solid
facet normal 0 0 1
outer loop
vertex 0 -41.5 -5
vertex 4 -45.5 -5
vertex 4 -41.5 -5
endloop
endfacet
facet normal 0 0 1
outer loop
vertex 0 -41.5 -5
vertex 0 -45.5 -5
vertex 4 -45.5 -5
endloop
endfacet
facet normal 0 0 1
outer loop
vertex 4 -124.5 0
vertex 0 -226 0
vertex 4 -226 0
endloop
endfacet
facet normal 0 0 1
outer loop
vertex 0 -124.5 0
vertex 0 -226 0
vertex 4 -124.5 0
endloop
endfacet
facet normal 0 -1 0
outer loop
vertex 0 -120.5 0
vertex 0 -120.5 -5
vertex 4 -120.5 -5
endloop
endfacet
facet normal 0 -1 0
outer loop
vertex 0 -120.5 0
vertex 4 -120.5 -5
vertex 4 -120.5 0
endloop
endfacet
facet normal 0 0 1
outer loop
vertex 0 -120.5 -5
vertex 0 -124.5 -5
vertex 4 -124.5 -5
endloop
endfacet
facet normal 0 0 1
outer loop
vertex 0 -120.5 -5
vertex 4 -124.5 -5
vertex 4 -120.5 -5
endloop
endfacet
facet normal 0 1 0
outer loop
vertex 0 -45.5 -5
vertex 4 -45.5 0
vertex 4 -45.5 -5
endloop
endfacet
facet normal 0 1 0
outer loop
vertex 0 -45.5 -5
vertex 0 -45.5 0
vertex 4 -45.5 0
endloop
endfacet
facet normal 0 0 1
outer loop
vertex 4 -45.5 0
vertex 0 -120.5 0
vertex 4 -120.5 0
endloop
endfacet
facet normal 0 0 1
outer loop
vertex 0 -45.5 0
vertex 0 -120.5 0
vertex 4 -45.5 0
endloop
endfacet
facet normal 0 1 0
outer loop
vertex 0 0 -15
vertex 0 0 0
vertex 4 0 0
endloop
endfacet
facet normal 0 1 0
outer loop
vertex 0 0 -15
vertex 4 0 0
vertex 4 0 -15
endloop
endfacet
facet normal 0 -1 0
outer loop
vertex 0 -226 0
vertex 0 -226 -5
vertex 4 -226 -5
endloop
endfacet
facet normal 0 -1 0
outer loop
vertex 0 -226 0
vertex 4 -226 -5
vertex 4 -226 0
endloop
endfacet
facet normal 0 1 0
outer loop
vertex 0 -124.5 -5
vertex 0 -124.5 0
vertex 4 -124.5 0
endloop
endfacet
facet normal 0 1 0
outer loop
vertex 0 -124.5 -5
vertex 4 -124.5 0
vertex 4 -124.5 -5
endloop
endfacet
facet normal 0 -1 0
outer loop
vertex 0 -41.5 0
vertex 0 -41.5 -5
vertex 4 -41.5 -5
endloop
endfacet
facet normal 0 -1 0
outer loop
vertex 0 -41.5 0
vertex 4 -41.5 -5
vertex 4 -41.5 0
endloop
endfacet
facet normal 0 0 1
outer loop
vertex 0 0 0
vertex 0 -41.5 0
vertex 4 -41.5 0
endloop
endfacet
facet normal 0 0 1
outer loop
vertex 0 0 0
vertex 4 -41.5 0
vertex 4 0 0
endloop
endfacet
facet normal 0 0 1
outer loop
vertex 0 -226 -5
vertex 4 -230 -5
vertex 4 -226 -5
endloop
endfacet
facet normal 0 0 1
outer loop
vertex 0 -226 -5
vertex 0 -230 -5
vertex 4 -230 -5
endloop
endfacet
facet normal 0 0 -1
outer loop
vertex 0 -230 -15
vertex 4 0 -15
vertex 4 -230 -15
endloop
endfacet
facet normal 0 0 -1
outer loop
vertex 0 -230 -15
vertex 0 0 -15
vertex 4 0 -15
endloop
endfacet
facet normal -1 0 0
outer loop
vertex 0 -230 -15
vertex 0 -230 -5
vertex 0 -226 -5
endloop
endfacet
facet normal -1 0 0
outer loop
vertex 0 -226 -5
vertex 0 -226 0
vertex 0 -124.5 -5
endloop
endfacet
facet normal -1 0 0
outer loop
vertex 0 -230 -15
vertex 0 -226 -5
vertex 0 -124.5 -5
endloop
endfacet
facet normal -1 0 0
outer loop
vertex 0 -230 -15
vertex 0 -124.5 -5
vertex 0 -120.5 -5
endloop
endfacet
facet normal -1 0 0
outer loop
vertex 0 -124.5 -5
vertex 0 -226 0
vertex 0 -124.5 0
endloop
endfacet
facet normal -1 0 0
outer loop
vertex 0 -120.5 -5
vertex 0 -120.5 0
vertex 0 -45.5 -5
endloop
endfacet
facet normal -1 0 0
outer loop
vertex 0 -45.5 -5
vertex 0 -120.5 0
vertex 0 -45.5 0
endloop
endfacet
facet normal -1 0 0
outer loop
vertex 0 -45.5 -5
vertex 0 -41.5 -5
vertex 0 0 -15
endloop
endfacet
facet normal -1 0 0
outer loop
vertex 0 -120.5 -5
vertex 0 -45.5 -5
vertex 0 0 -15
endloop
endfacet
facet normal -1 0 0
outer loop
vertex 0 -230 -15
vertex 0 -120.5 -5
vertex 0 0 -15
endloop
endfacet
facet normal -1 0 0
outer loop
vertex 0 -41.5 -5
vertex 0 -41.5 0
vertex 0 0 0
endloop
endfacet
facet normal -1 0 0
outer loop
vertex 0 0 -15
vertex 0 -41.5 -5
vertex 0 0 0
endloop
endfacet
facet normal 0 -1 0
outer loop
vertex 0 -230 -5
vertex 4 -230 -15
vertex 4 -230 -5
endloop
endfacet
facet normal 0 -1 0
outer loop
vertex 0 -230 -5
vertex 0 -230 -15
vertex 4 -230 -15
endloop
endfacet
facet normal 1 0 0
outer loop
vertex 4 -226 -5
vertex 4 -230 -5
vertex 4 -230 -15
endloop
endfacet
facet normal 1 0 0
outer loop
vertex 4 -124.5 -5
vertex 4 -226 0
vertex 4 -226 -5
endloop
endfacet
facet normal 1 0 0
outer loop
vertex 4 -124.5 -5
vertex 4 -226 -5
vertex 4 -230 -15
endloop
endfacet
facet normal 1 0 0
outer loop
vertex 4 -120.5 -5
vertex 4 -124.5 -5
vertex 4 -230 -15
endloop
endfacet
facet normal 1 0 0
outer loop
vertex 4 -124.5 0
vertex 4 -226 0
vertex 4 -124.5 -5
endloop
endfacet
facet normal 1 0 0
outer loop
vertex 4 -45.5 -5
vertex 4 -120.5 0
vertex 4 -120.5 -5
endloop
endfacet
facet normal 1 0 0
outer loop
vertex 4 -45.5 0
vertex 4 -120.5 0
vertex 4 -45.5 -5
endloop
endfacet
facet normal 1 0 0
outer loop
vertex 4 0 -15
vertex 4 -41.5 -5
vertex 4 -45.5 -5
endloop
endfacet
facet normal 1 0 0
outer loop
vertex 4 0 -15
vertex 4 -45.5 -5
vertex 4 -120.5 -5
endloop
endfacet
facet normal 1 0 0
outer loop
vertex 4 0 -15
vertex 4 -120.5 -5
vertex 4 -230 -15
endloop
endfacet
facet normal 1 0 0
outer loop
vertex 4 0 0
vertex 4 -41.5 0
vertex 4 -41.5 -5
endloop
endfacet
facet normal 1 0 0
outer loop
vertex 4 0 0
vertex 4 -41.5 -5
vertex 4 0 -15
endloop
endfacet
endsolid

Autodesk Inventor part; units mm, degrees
ref_plane "YZ Plane" through (0, 0, 0) normal (1, 0, 0) x (0, 1, 0)
ref_plane "XZ Plane" through (0, 0, 0) normal (0, 1, 0) x (-1, 0, 0)
ref_plane "XY Plane" through (0, 0, 0) normal (0, 0, 1) x (1, 0, 0)
sketch "Skizze1" plane through (0, 0, 0) normal (1, 0, 0) x (0, 1, 0)
  line L0 (0, 0) -> (0, -15)
  line L1 (0, -15) -> (-230, -15)
  line L2 (-230, -15) -> (-230, -5)
  line L3 (-230, -5) -> (-226, -5)
  line L4 (-226, -5) -> (-226, 0)
  line L5 (-226, 0) -> (-124.5, 0)
  line L6 (-124.5, 0) -> (-124.5, -5)
  line L7 (-124.5, -5) -> (-120.5, -5)
  line L8 (-120.5, -5) -> (-120.5, 0)
  line L9 (-120.5, 0) -> (-45.5, 0)
  line L10 (-45.5, 0) -> (-45.5, -5)
  line L11 (-45.5, -5) -> (-41.5, -5)
  line L12 (-41.5, -5) -> (-41.5, 0)
  line L13 (-41.5, 0) -> (0, 0)
  dimension "d0" = 4
  dimension "d1" = 10
  dimension "d6" = 101.5
  dimension "d8" = 41.5
  dimension "d10" = 5
  dimension "d11" = 75
extrude "Extrusion1" add sketch "Skizze1" along normal blind 4
properties part number "sideHolder" material "Pappel"
